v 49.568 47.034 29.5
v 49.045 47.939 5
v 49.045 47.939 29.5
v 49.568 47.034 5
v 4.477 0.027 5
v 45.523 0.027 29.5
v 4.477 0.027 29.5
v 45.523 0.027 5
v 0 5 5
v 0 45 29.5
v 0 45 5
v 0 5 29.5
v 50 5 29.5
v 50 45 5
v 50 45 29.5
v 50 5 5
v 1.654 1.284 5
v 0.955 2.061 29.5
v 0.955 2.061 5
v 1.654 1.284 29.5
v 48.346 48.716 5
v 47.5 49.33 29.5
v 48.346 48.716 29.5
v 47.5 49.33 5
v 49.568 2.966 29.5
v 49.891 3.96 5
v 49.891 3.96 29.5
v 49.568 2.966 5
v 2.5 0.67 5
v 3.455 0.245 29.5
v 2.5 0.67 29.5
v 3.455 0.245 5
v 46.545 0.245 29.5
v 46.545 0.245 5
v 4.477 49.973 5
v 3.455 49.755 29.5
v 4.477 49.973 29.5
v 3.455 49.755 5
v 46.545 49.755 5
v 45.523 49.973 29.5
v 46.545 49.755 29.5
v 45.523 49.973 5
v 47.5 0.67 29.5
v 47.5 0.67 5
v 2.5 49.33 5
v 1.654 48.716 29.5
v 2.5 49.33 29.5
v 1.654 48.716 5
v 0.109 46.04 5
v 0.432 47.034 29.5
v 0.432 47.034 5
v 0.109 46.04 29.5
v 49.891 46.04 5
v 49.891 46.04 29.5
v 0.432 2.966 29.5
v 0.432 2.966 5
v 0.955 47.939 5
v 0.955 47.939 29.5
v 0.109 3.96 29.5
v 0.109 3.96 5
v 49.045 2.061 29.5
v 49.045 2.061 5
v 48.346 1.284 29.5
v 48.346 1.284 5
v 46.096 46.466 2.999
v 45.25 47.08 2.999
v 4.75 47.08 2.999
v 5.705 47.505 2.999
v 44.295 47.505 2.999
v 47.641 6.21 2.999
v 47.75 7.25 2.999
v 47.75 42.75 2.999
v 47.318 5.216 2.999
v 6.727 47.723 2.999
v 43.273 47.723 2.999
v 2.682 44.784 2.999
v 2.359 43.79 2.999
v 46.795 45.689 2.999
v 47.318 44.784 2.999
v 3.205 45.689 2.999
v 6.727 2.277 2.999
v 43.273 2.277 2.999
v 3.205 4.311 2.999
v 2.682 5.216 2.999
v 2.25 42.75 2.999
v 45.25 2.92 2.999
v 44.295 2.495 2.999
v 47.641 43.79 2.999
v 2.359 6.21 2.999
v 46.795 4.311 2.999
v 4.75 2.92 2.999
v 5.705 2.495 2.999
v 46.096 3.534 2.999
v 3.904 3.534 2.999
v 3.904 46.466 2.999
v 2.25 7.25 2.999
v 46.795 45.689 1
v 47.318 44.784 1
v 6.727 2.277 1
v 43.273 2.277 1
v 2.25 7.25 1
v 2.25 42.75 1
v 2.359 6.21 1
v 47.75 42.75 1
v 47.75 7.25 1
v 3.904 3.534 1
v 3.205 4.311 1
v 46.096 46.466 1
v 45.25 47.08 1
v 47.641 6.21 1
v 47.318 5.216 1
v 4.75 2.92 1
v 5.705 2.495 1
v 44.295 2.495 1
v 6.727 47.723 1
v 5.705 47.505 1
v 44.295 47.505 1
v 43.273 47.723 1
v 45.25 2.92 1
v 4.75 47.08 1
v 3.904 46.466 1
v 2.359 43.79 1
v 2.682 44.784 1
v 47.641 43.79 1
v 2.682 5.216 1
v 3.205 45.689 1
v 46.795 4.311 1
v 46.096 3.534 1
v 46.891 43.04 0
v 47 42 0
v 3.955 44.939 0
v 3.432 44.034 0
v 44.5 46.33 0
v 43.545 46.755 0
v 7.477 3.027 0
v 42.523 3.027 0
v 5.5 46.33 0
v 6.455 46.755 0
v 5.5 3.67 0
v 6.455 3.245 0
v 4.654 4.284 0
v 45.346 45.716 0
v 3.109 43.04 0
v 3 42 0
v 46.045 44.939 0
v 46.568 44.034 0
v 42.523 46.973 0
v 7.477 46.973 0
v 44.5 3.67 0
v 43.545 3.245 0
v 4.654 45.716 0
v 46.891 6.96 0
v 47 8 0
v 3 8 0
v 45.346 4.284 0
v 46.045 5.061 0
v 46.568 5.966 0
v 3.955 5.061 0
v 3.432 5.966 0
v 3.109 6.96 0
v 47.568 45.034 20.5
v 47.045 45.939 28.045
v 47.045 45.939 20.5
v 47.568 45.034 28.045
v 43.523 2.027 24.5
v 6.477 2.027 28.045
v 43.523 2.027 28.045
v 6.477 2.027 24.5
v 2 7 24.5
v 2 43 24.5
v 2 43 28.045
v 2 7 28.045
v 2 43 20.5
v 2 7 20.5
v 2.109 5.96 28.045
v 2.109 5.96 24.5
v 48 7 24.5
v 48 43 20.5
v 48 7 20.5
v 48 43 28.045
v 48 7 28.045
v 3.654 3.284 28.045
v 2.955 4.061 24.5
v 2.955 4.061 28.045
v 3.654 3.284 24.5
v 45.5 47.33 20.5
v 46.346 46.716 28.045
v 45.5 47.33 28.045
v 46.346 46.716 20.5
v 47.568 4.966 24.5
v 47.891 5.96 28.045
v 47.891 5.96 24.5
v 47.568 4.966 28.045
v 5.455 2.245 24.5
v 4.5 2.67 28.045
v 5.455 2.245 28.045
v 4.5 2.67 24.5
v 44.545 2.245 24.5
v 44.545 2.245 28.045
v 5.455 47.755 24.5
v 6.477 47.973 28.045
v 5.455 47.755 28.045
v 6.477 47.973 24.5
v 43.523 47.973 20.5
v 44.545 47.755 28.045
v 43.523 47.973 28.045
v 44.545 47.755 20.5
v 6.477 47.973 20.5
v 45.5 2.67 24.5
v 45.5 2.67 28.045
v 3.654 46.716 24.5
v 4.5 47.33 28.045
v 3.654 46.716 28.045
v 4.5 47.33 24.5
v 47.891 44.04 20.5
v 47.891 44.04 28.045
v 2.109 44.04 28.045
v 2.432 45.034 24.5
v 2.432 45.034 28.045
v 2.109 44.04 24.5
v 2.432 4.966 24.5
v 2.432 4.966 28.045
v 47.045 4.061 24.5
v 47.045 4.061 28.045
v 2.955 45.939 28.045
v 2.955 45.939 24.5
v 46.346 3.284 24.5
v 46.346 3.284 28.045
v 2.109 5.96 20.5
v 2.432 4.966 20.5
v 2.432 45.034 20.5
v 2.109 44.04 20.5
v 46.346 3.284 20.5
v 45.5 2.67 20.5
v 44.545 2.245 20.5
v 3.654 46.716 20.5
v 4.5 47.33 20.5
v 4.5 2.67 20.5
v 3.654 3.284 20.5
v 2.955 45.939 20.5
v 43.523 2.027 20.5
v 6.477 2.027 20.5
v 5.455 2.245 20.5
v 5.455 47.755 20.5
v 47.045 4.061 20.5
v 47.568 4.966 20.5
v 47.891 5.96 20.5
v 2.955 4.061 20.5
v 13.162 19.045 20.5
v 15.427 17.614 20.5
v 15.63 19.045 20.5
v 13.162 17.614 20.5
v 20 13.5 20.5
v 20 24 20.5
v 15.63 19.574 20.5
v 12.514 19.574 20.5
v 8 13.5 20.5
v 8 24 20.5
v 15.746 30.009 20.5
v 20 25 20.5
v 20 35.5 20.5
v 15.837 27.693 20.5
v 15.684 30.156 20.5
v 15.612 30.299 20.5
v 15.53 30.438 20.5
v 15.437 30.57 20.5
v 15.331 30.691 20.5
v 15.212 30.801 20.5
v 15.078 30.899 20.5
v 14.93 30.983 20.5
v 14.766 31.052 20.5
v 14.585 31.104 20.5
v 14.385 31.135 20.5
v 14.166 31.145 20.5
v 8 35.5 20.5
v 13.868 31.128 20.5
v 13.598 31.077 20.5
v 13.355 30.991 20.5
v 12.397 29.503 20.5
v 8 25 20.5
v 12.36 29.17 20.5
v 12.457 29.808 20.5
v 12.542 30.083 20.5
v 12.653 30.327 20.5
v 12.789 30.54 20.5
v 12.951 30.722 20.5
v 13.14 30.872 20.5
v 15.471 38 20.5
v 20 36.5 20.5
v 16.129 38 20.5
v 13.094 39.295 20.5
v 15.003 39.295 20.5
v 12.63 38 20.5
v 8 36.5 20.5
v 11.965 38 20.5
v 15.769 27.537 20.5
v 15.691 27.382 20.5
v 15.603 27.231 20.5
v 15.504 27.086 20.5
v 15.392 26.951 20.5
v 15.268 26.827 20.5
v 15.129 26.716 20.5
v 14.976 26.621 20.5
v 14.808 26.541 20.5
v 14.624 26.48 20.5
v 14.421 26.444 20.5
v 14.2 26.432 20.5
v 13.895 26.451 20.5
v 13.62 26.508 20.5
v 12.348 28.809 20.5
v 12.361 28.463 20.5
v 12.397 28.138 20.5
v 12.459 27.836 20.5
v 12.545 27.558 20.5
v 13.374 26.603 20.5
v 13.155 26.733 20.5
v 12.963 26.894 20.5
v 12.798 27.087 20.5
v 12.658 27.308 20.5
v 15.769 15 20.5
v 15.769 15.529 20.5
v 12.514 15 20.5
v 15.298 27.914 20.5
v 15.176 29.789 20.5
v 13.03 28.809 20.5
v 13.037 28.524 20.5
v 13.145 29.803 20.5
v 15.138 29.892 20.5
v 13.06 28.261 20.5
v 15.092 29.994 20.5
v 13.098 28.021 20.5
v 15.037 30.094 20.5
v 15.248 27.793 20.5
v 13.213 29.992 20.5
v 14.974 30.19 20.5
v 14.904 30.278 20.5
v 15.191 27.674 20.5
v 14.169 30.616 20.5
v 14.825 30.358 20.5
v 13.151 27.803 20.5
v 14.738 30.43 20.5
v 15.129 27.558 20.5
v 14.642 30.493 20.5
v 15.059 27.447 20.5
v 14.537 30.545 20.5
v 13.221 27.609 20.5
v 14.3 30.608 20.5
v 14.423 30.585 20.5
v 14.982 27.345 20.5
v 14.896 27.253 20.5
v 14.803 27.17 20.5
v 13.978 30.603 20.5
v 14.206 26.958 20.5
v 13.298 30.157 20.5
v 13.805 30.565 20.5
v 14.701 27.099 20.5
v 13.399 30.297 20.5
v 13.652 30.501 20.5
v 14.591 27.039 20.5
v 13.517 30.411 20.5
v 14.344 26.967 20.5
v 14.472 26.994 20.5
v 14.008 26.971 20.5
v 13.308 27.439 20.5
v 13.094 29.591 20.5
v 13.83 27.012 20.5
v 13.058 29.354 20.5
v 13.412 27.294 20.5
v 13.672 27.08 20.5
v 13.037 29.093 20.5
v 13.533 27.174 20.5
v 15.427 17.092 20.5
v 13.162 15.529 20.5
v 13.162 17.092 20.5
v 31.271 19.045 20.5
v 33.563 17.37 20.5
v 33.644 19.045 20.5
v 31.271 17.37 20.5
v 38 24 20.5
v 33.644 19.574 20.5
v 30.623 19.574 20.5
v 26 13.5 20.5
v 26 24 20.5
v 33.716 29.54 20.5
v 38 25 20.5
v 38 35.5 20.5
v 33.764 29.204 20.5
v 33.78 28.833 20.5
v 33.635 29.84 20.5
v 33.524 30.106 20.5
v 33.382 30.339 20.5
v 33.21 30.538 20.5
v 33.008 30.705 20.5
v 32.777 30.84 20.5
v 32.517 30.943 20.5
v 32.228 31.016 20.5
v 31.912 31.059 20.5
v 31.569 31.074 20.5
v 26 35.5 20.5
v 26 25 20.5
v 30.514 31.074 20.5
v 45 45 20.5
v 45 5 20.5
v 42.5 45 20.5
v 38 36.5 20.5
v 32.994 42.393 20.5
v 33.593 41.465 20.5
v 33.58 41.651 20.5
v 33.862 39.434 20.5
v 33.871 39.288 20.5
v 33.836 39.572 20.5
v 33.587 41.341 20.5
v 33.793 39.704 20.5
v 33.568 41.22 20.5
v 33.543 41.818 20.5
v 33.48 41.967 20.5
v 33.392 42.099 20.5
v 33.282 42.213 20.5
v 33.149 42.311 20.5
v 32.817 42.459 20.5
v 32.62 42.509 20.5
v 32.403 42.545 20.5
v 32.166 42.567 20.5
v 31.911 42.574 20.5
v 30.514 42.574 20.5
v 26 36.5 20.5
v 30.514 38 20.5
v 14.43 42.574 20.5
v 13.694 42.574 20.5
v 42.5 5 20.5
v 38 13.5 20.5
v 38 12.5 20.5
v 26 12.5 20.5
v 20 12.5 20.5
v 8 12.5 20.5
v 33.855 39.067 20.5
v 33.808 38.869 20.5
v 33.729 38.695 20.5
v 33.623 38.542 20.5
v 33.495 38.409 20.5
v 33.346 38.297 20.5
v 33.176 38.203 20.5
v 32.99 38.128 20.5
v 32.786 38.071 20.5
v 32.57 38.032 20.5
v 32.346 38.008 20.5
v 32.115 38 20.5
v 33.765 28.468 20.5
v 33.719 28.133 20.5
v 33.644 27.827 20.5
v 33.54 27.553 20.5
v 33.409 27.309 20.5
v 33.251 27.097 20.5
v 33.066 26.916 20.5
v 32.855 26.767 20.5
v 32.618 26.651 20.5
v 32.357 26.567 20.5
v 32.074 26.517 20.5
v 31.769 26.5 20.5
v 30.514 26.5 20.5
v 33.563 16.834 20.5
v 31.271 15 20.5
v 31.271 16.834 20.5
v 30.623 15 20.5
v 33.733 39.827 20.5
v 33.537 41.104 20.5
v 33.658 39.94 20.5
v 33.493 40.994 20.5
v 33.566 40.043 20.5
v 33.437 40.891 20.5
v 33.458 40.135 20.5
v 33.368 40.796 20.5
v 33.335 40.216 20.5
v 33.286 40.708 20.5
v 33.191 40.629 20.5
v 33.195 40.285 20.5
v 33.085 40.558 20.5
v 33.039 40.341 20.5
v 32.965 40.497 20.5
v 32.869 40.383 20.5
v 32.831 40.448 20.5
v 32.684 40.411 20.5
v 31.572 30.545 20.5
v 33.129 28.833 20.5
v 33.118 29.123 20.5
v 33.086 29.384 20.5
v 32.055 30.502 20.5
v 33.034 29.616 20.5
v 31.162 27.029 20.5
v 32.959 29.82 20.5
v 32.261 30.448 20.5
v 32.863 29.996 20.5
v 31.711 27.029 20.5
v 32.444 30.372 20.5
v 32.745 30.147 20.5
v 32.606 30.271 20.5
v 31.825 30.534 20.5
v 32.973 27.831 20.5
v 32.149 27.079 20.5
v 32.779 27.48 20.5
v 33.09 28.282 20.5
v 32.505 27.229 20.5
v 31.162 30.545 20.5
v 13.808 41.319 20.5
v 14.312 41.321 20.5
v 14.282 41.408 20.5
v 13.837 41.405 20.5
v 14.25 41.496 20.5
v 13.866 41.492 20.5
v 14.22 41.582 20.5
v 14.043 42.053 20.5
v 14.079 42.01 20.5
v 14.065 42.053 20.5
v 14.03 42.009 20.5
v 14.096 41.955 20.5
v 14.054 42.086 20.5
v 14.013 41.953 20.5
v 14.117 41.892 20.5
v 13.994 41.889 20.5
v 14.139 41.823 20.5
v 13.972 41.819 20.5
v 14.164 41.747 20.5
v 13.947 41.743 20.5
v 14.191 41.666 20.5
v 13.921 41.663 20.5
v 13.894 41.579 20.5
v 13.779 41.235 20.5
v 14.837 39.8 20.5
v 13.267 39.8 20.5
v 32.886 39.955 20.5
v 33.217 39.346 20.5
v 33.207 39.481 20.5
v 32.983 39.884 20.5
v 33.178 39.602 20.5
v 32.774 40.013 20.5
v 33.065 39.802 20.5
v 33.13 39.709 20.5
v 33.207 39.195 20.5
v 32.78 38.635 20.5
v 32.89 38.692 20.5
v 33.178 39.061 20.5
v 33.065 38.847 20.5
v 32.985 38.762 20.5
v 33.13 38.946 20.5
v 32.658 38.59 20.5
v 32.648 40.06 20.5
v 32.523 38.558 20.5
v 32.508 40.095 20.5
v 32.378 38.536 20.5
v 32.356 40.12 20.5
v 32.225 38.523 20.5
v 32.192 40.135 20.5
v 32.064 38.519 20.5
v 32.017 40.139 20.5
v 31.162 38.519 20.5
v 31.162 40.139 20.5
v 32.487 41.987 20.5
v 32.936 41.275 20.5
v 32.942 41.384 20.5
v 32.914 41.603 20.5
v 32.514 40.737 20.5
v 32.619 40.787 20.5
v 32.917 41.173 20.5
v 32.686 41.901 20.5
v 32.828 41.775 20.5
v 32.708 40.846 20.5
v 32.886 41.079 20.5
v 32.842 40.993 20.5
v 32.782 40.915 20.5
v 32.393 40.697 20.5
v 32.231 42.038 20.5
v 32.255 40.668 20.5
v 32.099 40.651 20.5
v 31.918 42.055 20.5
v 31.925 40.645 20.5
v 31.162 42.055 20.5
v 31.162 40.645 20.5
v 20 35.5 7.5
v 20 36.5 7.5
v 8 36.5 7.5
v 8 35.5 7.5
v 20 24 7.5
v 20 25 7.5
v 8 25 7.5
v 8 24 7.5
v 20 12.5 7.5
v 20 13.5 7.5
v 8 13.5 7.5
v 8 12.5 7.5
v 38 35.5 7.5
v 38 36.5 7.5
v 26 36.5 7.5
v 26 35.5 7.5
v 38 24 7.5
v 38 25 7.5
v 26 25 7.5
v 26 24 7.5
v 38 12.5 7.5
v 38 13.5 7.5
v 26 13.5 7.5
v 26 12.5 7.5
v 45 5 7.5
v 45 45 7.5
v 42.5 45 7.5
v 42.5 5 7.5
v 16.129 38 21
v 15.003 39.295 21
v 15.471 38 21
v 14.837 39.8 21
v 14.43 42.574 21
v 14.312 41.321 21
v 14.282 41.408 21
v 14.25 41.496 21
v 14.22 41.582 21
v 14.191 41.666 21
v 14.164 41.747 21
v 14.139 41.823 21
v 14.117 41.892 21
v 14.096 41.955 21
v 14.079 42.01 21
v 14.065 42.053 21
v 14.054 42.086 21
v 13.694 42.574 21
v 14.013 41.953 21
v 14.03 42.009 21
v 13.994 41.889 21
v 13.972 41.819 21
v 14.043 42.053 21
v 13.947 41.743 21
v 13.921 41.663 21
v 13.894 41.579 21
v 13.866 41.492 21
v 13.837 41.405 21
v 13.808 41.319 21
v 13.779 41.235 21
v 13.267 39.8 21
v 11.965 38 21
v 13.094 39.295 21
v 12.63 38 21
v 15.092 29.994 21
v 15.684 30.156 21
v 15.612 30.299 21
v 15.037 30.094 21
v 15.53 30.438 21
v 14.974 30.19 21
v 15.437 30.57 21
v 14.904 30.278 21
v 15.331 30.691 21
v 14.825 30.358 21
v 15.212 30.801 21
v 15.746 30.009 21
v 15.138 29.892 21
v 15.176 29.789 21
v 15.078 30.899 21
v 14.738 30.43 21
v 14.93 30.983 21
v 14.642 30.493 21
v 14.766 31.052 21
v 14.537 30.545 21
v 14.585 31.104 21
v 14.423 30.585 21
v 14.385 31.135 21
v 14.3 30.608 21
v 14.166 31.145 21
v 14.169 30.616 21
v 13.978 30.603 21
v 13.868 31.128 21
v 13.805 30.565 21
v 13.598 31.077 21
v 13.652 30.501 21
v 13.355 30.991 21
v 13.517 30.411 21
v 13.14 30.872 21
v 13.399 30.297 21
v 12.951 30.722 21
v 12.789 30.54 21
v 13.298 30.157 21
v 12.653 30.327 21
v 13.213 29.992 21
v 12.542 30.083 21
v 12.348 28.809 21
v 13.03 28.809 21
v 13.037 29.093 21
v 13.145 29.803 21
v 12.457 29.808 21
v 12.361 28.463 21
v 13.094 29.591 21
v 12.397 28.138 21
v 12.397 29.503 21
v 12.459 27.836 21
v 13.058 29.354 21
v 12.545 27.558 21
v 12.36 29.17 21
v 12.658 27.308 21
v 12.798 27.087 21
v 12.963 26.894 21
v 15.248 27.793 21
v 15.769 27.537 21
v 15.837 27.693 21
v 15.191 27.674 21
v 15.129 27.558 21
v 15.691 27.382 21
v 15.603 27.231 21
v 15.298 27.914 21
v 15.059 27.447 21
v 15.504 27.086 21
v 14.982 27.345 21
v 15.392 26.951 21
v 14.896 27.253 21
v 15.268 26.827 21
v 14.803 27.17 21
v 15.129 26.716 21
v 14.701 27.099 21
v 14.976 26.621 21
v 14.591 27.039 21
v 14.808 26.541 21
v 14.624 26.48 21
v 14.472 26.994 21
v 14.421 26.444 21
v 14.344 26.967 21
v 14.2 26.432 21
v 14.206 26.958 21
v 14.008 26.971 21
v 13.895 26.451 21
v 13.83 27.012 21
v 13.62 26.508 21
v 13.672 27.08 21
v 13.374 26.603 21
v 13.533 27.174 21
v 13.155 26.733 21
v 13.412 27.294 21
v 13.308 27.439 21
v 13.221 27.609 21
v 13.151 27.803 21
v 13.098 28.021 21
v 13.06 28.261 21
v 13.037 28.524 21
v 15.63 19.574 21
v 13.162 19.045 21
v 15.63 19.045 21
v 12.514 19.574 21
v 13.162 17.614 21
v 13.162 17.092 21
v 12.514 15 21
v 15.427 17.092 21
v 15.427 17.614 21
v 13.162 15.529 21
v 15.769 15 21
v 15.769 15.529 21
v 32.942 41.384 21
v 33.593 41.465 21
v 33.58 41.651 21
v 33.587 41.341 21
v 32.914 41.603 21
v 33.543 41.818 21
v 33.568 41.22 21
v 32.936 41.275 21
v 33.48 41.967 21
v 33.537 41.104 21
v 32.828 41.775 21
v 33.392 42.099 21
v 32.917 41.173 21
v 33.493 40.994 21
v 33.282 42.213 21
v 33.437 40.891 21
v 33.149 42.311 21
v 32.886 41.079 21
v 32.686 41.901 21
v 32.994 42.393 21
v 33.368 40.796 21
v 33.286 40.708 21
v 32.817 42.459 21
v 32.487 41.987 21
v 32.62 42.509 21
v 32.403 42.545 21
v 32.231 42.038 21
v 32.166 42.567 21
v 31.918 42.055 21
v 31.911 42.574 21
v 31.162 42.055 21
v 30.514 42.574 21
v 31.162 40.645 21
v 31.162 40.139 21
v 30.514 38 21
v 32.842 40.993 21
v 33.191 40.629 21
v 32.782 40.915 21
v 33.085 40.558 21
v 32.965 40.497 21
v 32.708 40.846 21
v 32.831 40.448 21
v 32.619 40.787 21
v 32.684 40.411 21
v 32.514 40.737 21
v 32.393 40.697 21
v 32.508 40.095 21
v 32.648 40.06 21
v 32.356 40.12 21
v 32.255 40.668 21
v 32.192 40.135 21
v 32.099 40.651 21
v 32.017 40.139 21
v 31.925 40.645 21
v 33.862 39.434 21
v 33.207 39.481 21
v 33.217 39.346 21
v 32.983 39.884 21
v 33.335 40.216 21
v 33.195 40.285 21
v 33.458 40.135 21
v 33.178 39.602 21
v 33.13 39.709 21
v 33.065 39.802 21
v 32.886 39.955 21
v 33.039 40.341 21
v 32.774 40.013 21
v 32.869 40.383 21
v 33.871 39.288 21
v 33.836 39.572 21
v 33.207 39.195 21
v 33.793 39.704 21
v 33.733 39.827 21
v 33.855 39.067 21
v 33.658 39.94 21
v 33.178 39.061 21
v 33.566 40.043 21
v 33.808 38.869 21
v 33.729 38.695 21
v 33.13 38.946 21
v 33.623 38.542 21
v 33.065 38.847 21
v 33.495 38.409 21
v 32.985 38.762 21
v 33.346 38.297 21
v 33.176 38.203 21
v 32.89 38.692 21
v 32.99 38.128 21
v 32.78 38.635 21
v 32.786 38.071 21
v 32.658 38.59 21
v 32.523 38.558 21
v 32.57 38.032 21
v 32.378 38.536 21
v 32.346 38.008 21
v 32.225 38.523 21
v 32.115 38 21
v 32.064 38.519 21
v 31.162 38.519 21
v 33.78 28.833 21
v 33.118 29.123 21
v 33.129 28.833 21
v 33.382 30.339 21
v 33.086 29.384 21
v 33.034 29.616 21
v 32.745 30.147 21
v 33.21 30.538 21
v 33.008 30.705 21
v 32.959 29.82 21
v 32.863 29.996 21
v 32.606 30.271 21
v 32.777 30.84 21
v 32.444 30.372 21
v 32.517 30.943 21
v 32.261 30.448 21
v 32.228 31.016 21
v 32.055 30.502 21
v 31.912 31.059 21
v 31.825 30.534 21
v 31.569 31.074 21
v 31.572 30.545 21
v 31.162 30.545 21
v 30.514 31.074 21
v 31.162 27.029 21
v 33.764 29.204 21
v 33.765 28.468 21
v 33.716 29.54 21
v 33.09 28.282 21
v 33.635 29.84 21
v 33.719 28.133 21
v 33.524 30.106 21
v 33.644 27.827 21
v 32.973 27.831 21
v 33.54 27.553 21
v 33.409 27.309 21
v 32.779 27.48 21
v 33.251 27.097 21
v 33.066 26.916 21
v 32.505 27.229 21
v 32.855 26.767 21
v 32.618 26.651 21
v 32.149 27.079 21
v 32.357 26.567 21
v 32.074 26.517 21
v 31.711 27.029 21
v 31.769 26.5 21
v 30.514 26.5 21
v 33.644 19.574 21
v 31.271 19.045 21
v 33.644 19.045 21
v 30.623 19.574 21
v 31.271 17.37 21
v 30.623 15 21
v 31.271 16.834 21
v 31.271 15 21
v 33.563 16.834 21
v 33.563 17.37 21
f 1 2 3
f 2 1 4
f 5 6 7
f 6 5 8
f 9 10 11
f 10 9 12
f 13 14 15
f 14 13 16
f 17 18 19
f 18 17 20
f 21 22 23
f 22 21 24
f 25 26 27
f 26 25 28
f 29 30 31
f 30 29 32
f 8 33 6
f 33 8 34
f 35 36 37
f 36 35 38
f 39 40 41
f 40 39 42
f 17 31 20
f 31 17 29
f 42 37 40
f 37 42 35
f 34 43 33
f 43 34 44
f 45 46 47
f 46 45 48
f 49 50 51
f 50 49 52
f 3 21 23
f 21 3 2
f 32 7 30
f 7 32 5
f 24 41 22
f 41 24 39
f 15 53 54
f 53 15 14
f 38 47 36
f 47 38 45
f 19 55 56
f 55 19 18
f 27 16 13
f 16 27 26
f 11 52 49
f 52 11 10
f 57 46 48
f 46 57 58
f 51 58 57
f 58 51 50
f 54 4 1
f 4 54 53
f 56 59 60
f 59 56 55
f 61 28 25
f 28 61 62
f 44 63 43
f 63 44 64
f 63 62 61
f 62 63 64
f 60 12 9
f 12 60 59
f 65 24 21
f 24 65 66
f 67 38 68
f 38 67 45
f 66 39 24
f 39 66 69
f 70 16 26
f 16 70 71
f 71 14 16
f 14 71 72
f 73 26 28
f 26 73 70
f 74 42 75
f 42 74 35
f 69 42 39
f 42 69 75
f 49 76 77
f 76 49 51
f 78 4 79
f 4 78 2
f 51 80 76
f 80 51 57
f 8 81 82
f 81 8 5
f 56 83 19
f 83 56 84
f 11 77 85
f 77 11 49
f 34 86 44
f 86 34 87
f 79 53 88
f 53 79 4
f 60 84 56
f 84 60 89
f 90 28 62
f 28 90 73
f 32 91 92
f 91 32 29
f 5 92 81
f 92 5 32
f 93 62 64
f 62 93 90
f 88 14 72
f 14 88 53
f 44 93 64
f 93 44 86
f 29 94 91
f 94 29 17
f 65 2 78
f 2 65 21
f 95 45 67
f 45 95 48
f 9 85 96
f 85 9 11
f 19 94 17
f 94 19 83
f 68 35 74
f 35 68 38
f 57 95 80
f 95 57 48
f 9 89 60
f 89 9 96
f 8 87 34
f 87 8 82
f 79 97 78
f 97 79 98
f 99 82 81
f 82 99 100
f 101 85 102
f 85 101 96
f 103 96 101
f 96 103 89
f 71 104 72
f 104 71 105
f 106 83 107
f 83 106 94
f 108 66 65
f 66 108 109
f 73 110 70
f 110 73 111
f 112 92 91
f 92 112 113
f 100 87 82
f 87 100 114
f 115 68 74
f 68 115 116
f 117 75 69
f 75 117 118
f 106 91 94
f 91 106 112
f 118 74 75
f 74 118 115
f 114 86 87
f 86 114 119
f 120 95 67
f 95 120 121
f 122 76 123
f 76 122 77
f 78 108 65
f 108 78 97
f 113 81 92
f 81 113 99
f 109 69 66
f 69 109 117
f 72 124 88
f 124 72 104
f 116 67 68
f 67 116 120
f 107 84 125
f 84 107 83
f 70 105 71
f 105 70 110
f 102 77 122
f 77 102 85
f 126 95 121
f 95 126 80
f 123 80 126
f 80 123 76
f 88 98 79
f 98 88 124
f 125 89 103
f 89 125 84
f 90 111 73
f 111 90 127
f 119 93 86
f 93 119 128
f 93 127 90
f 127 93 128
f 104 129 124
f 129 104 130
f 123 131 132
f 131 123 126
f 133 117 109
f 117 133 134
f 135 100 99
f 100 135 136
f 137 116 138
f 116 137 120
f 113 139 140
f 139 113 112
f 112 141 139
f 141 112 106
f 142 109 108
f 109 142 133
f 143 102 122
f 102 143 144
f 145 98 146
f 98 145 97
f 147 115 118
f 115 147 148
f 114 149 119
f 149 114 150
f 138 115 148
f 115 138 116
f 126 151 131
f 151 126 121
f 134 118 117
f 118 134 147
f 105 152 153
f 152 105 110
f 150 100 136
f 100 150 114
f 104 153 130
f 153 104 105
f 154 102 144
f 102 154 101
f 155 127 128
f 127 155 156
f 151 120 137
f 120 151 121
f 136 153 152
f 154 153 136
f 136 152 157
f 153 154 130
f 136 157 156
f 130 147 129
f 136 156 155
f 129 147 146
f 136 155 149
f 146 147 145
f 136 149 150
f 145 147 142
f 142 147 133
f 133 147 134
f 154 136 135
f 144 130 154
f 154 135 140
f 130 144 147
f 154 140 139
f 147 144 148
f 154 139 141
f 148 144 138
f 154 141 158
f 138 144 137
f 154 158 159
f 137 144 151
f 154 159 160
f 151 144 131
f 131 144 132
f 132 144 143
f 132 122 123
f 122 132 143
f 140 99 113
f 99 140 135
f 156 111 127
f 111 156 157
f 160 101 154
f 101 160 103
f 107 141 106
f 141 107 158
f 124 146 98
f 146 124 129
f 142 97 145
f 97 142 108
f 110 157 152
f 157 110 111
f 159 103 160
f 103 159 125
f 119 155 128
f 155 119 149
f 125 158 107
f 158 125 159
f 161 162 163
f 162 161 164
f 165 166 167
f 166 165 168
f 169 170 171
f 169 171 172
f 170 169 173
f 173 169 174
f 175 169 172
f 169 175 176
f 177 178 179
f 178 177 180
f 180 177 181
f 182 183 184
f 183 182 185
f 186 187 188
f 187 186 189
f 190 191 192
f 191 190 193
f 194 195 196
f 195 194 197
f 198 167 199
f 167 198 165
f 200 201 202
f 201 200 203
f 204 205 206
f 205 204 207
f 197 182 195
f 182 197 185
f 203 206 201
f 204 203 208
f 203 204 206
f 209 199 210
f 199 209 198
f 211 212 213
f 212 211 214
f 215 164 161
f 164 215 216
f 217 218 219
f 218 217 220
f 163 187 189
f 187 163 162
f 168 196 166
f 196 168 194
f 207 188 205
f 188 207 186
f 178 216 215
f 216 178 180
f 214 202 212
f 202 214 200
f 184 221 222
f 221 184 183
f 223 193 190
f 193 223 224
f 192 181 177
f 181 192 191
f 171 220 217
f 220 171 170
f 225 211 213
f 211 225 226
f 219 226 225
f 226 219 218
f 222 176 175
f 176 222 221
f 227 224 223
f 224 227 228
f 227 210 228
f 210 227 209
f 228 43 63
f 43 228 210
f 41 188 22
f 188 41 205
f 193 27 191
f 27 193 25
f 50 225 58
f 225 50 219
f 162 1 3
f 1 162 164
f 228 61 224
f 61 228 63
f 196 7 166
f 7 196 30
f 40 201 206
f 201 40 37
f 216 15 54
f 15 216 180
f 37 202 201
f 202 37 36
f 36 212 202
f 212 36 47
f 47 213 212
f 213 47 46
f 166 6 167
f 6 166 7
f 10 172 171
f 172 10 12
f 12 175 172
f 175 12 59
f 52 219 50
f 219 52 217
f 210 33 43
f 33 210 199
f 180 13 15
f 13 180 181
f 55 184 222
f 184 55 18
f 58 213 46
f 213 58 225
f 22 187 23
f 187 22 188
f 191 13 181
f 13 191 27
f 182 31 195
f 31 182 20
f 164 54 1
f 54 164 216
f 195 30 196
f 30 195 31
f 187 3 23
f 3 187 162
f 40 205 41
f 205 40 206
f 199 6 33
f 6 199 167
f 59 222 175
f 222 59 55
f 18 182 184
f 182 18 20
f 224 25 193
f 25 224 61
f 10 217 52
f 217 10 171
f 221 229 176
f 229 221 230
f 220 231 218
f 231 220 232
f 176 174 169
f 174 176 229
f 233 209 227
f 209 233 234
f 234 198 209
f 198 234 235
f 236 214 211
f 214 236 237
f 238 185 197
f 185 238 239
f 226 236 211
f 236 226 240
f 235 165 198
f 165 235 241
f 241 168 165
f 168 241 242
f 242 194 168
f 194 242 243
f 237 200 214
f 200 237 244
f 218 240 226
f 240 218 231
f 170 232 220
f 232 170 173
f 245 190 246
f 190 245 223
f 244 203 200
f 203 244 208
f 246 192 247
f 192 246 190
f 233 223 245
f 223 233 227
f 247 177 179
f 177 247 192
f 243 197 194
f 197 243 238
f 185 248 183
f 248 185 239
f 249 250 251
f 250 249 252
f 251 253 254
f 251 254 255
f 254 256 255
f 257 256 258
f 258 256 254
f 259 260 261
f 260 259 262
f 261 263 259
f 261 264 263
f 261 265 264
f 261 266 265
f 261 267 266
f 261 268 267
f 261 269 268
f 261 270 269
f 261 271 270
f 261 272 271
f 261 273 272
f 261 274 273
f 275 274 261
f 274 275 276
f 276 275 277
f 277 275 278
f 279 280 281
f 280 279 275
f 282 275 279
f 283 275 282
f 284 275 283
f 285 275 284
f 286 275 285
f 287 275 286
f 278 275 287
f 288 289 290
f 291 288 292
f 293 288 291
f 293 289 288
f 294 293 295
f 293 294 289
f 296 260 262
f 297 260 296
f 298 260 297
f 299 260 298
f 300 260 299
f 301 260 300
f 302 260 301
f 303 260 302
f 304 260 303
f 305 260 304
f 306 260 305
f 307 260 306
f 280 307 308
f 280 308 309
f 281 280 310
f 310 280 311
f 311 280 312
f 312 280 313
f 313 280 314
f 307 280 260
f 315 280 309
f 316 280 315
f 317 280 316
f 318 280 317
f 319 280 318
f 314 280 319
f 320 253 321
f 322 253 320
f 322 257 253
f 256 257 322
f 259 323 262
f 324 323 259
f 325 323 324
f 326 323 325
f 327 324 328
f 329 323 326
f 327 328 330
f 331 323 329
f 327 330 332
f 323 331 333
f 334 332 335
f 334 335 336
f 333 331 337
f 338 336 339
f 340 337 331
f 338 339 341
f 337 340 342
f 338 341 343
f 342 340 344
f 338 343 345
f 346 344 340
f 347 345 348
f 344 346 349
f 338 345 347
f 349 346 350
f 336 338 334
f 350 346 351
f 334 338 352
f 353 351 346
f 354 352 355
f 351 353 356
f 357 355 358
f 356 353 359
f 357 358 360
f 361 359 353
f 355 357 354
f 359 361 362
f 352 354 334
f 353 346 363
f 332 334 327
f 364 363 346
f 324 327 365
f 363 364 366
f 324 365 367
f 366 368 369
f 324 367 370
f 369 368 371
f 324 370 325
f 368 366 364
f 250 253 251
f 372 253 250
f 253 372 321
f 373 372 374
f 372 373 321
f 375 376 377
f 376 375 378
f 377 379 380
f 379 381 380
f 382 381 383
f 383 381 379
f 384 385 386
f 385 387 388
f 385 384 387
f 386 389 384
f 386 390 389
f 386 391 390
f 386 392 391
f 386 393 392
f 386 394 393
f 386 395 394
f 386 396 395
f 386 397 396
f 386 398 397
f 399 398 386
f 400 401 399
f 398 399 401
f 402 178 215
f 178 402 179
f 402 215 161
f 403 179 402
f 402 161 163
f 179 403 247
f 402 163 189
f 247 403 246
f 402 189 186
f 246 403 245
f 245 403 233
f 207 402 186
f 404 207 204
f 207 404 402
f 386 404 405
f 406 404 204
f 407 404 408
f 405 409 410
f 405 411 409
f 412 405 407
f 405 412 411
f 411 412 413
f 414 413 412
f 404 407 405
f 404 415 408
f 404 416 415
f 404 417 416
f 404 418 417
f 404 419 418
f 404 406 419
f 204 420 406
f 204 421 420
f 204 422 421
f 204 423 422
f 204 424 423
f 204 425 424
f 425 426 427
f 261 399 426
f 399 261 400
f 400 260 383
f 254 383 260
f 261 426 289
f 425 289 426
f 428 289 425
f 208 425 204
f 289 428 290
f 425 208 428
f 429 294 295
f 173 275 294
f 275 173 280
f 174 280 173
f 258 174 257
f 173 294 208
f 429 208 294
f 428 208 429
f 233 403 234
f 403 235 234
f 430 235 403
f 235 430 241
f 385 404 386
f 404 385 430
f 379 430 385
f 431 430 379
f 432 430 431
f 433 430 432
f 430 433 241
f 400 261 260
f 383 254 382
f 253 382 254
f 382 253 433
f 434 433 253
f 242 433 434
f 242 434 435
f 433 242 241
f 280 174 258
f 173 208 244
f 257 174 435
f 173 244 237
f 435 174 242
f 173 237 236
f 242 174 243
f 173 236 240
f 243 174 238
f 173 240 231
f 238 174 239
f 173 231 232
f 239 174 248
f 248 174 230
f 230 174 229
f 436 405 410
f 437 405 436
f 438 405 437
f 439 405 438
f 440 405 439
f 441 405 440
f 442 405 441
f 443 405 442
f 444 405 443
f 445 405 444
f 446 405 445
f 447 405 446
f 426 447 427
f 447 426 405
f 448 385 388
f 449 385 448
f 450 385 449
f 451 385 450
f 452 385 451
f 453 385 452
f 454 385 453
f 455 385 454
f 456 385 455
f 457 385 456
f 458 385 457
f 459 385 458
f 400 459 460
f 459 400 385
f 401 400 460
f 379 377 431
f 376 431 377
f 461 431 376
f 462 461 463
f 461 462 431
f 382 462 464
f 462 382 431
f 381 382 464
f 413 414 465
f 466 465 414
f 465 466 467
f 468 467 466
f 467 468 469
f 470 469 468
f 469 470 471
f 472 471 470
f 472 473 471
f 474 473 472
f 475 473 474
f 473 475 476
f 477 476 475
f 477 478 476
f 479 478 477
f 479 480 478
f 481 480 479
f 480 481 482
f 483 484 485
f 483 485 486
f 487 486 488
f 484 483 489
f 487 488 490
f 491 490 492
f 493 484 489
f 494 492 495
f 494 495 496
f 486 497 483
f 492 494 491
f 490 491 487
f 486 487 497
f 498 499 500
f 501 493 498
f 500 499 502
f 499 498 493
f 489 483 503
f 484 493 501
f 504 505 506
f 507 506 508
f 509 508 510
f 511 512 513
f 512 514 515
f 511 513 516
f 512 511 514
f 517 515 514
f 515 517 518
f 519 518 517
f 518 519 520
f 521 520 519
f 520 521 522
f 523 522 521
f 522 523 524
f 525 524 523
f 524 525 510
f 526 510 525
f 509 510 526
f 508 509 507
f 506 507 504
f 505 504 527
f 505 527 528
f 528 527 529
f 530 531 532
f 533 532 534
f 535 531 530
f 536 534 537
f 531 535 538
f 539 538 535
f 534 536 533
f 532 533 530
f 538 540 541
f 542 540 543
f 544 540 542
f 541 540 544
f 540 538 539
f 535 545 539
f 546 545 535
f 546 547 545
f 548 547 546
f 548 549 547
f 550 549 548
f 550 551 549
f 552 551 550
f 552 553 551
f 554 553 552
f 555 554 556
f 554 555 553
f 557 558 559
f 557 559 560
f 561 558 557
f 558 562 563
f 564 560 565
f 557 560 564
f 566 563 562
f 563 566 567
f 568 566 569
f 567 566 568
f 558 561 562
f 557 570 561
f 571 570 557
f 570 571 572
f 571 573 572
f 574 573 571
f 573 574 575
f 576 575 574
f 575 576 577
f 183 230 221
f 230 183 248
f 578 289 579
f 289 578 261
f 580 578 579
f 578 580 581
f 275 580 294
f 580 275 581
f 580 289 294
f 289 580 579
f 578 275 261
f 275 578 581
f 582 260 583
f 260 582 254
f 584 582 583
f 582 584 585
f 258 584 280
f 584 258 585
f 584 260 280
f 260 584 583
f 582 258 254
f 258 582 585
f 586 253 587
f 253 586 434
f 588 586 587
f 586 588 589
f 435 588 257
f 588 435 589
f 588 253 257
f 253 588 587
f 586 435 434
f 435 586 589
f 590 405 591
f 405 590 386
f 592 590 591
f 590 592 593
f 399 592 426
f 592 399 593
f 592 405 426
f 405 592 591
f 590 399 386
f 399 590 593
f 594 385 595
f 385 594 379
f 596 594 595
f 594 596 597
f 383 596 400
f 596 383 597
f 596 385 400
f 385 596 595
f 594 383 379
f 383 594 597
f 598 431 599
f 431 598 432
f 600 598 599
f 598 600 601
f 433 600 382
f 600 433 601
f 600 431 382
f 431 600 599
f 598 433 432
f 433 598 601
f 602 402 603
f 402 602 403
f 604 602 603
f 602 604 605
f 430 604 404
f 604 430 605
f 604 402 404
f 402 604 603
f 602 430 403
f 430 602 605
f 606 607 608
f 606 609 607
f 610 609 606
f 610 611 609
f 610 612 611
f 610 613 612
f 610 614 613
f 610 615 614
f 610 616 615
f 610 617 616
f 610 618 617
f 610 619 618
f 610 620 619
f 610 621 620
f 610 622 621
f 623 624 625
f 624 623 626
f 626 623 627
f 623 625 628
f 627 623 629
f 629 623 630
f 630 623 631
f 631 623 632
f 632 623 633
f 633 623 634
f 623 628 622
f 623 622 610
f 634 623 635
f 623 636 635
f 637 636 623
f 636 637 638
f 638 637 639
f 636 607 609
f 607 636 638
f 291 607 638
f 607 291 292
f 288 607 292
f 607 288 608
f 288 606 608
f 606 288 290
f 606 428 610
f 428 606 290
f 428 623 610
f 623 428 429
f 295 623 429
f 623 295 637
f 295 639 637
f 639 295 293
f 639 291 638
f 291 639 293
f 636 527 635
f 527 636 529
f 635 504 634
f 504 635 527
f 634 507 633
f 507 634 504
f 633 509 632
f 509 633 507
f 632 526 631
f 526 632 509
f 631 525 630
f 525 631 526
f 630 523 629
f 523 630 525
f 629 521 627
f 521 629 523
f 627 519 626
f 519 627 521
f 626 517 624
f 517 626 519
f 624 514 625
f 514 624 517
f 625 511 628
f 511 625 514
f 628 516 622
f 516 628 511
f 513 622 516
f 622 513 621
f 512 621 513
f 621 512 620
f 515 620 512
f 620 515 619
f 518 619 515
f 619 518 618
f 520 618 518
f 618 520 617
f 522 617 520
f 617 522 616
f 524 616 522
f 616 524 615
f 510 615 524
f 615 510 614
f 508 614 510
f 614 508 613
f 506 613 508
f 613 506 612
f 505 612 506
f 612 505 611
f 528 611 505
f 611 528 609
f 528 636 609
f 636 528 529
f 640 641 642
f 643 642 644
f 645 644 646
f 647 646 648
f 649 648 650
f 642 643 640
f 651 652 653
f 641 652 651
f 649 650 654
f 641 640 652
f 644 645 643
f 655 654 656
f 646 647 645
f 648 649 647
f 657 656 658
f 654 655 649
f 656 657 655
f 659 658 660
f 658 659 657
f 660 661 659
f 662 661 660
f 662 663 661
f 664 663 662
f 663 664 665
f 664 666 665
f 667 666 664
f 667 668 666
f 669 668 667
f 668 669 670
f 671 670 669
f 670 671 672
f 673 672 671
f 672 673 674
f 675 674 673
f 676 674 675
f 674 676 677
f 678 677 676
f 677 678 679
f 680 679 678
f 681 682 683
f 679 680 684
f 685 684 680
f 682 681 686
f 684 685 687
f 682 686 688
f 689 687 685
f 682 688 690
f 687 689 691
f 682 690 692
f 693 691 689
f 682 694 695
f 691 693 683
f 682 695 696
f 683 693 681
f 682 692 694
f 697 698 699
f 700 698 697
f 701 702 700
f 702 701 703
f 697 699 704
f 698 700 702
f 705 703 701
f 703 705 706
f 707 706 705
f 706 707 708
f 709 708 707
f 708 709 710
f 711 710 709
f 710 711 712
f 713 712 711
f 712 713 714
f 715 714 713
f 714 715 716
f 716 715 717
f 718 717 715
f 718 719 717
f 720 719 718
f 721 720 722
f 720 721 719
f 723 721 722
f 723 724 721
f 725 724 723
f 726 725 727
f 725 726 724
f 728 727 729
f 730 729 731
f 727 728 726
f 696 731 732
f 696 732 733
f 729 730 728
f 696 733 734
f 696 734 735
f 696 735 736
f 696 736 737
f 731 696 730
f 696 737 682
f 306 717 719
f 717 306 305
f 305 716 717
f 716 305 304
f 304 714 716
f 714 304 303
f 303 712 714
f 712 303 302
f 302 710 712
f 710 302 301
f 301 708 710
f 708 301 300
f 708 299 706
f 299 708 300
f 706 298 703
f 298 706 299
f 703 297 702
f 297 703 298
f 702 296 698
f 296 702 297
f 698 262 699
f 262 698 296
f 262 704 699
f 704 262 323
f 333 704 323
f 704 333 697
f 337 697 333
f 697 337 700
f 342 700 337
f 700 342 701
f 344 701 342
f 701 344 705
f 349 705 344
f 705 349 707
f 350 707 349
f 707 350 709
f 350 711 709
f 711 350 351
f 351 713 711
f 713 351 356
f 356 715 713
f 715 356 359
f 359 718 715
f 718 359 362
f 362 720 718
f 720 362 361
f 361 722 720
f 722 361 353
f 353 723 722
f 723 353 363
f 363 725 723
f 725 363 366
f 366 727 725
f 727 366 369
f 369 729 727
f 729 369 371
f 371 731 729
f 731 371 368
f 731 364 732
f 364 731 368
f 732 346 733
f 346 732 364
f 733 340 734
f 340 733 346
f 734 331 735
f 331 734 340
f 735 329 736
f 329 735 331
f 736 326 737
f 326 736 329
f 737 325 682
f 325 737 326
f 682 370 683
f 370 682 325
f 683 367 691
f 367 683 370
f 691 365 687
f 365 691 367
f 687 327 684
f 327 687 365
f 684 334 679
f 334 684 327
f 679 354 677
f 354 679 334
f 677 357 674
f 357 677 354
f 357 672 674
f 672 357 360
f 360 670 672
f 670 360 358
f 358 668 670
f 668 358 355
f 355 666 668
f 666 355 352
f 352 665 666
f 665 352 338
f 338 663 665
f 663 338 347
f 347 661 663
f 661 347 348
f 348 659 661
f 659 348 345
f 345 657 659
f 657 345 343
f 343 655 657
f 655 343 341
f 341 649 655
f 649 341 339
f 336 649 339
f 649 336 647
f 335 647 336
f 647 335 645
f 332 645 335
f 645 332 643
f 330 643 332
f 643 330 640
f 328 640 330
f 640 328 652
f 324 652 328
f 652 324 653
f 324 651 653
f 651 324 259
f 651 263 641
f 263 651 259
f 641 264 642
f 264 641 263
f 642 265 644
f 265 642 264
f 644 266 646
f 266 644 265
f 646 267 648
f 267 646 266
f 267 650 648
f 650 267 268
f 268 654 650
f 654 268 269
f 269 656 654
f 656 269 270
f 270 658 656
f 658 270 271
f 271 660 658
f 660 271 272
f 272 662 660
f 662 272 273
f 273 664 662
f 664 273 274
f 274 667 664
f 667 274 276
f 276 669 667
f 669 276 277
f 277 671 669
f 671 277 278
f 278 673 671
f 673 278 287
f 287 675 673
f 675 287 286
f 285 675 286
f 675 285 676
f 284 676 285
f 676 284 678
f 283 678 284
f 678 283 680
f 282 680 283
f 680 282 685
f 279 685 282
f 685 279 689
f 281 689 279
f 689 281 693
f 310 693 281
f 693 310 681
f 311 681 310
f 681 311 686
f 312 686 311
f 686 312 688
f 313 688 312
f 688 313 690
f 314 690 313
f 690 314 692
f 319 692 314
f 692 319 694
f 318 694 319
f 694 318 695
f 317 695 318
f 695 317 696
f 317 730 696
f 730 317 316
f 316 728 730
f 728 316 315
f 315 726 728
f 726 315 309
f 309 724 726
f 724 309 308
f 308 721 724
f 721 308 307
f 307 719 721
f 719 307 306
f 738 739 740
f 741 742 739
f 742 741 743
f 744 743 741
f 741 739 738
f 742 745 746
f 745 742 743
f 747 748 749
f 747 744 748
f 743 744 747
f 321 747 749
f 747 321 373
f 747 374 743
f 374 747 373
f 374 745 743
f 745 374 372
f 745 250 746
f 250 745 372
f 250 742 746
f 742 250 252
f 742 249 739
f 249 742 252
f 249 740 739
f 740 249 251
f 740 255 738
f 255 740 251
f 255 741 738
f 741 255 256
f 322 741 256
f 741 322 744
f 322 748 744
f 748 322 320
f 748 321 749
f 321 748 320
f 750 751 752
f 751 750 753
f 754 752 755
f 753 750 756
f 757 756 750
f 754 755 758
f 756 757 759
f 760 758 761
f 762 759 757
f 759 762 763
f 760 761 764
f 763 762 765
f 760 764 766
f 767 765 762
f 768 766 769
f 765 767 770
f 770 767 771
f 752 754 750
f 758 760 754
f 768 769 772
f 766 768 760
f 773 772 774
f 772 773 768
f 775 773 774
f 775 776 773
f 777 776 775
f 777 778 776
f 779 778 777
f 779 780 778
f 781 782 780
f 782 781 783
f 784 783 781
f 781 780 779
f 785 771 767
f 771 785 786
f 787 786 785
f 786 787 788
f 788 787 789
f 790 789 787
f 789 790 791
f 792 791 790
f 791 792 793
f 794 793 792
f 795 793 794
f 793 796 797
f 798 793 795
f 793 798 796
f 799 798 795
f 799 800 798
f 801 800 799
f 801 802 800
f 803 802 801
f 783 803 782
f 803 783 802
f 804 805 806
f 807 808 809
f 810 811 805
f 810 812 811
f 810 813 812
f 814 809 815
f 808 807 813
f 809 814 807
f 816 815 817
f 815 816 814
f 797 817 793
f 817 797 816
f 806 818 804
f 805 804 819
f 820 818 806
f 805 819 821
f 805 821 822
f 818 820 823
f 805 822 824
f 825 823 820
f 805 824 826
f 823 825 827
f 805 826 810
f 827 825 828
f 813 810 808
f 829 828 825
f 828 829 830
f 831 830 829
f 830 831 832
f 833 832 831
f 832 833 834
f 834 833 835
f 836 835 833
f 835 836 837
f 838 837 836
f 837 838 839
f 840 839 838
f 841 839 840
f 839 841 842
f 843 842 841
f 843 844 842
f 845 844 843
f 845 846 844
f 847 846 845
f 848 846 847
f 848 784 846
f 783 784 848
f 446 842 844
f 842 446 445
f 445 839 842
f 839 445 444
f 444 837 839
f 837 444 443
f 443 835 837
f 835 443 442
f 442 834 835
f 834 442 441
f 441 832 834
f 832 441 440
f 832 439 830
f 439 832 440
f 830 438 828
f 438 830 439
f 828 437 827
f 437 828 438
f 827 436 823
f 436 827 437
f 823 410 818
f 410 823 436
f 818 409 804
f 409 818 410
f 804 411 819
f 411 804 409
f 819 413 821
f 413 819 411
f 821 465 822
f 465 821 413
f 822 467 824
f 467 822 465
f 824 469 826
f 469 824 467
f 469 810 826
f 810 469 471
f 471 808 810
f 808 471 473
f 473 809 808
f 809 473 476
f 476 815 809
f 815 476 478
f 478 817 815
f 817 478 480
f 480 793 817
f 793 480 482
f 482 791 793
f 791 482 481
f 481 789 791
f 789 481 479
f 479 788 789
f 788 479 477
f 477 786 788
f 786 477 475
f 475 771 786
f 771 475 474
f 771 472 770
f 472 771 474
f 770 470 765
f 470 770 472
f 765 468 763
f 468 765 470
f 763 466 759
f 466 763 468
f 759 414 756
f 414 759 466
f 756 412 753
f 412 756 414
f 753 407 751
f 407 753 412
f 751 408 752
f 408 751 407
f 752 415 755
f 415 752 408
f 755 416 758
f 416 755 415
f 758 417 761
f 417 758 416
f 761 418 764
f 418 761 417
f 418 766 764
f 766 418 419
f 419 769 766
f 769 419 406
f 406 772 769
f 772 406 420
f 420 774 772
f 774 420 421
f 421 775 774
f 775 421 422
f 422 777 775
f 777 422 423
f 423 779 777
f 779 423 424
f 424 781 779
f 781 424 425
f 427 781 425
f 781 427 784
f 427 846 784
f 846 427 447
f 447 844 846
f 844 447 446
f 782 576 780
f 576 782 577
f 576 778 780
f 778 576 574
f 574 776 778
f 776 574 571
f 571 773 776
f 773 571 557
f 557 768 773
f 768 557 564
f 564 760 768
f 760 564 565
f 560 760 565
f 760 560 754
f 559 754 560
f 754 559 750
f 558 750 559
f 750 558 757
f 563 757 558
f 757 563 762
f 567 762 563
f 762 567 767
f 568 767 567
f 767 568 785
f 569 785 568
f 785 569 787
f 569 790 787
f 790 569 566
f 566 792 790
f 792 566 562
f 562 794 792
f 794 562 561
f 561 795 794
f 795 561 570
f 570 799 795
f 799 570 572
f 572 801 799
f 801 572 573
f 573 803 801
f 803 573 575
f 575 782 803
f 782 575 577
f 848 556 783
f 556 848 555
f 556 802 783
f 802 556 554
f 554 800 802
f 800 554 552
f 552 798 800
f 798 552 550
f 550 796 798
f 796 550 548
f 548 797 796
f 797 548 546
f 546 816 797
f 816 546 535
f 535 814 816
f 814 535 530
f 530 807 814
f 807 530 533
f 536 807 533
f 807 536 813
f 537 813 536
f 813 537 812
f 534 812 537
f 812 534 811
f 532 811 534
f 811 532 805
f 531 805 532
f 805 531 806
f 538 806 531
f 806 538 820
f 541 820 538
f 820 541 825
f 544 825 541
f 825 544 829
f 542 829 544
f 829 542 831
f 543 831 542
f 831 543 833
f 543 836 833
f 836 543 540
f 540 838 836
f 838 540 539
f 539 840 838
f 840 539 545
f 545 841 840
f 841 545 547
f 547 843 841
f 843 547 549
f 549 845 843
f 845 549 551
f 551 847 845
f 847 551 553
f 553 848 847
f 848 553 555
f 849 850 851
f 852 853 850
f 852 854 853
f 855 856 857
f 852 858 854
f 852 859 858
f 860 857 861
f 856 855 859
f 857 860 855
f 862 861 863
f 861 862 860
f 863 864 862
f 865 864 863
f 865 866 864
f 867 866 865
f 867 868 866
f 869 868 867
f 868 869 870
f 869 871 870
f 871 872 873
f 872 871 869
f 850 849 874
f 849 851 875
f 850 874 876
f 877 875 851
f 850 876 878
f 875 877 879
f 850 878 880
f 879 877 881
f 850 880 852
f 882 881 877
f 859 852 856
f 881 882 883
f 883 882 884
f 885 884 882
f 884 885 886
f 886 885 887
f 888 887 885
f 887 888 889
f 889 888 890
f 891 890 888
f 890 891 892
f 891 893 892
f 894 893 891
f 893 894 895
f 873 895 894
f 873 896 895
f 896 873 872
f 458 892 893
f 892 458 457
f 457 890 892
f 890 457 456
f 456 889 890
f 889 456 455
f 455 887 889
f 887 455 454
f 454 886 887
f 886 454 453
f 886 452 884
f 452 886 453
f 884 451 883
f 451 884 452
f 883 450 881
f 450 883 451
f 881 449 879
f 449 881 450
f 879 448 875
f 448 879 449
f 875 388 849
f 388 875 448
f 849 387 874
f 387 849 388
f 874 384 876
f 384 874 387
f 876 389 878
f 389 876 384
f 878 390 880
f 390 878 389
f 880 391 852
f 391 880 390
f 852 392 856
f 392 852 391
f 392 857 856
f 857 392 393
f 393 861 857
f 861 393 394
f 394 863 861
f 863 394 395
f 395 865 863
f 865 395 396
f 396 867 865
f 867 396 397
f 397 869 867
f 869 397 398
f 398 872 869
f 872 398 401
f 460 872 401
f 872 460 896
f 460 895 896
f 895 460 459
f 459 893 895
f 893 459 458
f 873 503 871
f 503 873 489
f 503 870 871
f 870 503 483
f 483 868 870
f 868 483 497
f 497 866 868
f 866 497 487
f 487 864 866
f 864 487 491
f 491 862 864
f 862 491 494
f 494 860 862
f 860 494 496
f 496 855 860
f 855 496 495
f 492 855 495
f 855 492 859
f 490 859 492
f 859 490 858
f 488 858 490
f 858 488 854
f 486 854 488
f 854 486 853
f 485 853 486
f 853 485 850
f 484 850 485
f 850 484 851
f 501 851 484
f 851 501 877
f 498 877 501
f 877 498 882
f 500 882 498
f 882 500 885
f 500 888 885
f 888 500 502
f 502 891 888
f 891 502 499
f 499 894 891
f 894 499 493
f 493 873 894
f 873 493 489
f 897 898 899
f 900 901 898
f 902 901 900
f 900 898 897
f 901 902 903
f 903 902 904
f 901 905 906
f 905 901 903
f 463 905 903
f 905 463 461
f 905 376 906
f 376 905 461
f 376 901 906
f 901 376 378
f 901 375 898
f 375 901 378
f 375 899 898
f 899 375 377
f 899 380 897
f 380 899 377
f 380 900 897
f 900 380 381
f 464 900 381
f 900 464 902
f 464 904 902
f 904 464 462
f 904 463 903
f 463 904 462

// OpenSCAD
// file: modules.scad
// Demos
frame(50, 1*25);
translate([55, 0, 0]) frame(50, 2*25);
translate([25, 55, 0]) frame(
        head_size=[100, 50], head_height=1*25,
        body_size=[100-4.5, 50-4.5], foot_size=[100-6, 50-6]);
translate([-55, 25, 0]) frame(
        head_size=[50, 100], head_height=1*25,
        body_size=[50-4.5, 100-4.5], foot_size=[50-6, 100-6]);

module frameallowed(
        head_size=50, head_height=25, neck_height=2, body_size=45.5, body_height=2,
        leg_height=1, foot_size=44, r=5, fn=30, really_small_number=0.001,
        thickness=2, stacking_body_size_tolerance=0.5,
        stacking_height_sans_head_tolerance=0.5) {
    // Use this for an intersect, to trim protruding elements.

    head_size = head_size[0] == undef ? [head_size, head_size] : head_size;
    body_size = body_size[0] == undef ? [body_size, body_size] : body_size;
    foot_size = foot_size[0] == undef ? [foot_size, foot_size] : foot_size;

    union() {
        frame(
            head_size=head_size, head_height=head_height, neck_height=neck_height,
            body_size=body_size, body_height=body_height, leg_height=leg_height,
            foot_size=foot_size, r=r, fn=fn, 
            really_small_number=really_small_number,
            thickness=thickness, 
            stacking_body_size_tolerance=stacking_body_size_tolerance,
            stacking_height_sans_head_tolerance=stacking_height_sans_head_tolerance);
        framefilled(
            head_size=head_size,
            head_height=head_height-neck_height-body_height-leg_height-
                stacking_height_sans_head_tolerance,
            neck_height=neck_height, body_size=body_size,
            body_height=body_height, leg_height=leg_height,
            foot_size=foot_size, r=r, fn=fn, 
            really_small_number=really_small_number);
    }
}

module frame(
        head_size=50, head_height=25, neck_height=2, body_size=45.5, body_height=2,
        leg_height=1, foot_size=44, r=5, fn=30, really_small_number=0.001,
        thickness=2, stacking_body_size_tolerance=0.5,
        stacking_height_sans_head_tolerance=0.5) {

    head_size = head_size[0] == undef ? [head_size, head_size] : head_size;
    body_size = body_size[0] == undef ? [body_size, body_size] : body_size;
    foot_size = foot_size[0] == undef ? [foot_size, foot_size] : foot_size;

    difference() {
        framefilled(
            head_size=head_size, head_height=head_height, neck_height=neck_height,
            body_size=body_size, body_height=body_height, leg_height=leg_height,
            foot_size=foot_size, r=r, fn=fn, 
            really_small_number=really_small_number);
        translate([0, 0, thickness])
            framefilled(
                head_size=[head_size[0]-2*thickness, head_size[1]-2*thickness],
                head_height=head_height-thickness,
                neck_height=neck_height,
                body_size=[body_size[0]-2*thickness, body_size[1]-2*thickness],
                body_height=body_height, leg_height=leg_height,
                foot_size=[foot_size[0]-2*thickness, foot_size[1]-2*thickness],
                r=r, fn=fn, really_small_number=really_small_number);
        translate([0, 0, head_height-stacking_height_sans_head_tolerance])
            framefilled(
                head_size=head_size, head_height=head_height,
                neck_height=neck_height,
                body_size=[
                    body_size[0]-2*stacking_body_size_tolerance,
                    body_size[1]-2*stacking_body_size_tolerance],
                body_height=body_height, leg_height=leg_height,
                foot_size=[
                    foot_size[0]-2*stacking_body_size_tolerance,
                    foot_size[1]-2*stacking_body_size_tolerance],
                r=r, fn=fn, really_small_number=really_small_number);
    }
}

// NB the body size must be slightly smaller than head_size minus twice
// the thickness, so that the frames can stack.
module framefilled(
        head_size=50, head_height=25, neck_height=2, body_size=45.5, body_height=2,
        leg_height=1, foot_size=44, r=5, fn=30, really_small_number=0.001) {

    head_size = head_size[0] == undef ? [head_size, head_size] : head_size;
    body_size = body_size[0] == undef ? [body_size, body_size] : body_size;
    foot_size = foot_size[0] == undef ? [foot_size, foot_size] : foot_size;

    union() {
        hull() {head(); crown();}
        hull() {body(); head();}
        hull() {leg(); body();}
        hull() {foot(); leg();}
    }

    module crown() {
        translate(
            [0, 0, leg_height+body_height+neck_height+head_height-really_small_number])
        linear_extrude(height=really_small_number)
            roundedsquare(head_size, r=r, center=true, $fn=fn);
    }

    module head() {
        translate([0, 0, leg_height+body_height+neck_height])
        linear_extrude(height=really_small_number)
            roundedsquare(head_size, r=r, center=true, $fn=fn);
    }

    module body() {
        translate([0, 0, leg_height+body_height-really_small_number])
        linear_extrude(height=really_small_number)
            roundedsquare(body_size, r=r, center=true, $fn=fn);
    }

    module leg() {
        translate([0, 0, leg_height])
        linear_extrude(height=really_small_number)
            roundedsquare(body_size, r=r, center=true, $fn=fn);
    }

    module foot() {
        linear_extrude(height=really_small_number)
            roundedsquare(foot_size, r=r, center=true, $fn=fn);
    }
}

module roundedsquare(
        size=1, r=0.5, center=false, fn=30, really_small_number=0.001) {
    // Draw a square or rectangle with rounded corners.
    //
    // - size :: a number for length of the sides of a square, or a vector of
    //           two numbers for the width and height of a rectangle.
    // - r :: a number for radius of the rounded corners, or a vector of four
    //        numbers for the radii of of the top-right, top-left, bottom-left,
    //        and bottom-right rounded corners respectively (top and right are
    //        the positive y and x directions respectively); 0 indicates that
    //        a corner should not be rounded
    // - center :: boolean indicating if the shape should be centered
    // - fn :: the $fn parameter for circles, used for all rounded corners
    // - really_small_number :: a number which is effectively zero but not
    //                          actually zero; used internally to draw points

    size = size[0] == undef ? [size, size] : size;
    r = r[0] == undef ? [r, r, r, r] : r;

    translate(center ? [-size[0]/2, -size[1]/2] : [0, 0])
        hull() {
            // Top-right corner
            if (r[0] == 0) {
                translate(
                        [size[0]-really_small_number,
                         size[1]-really_small_number])
                    square(really_small_number);
            } else {
                translate([size[0]-r[0], size[1]-r[0]])
                    circle(r=r[0], $fn=fn);
             }
             // Top-left corner
            if (r[1] == 0) {
                translate([0, size[1]-really_small_number])
                    square(really_small_number);
            } else {
                translate([r[1], size[1]-r[1]])
                    circle(r=r[1], $fn=fn);
             }
             // Bottom-left corner
            if (r[2] == 0) {
                translate([0, 0])
                    square(really_small_number);
            } else {
                translate([r[2], r[2]])
                    circle(r=r[2], $fn=fn);
             }
             // Bottom-right corner
             if (r[3] == 0) {
                translate([size[0]-really_small_number, 0])
                    square(really_small_number);
            } else {
                translate([size[0]-r[3], r[3]])
                    circle(r=r[3], $fn=fn);
             }
         }
}
// main file
use <modules.scad>;

// The dimensions of a micro SD card
microsd_size = [11, 1, 15];
// The difference between dimensions of the slot and the aforementioned
microsd_tolerance = [1, 0, -2];
// Estimated space between top of a slotted SD card and frame stacked above
microsd_stack_gap = 2;
// Gap for a paper note
paper_size = [1.5, 40, 20];

thickness_wall = 2;
slot_left_margin = 6;
font_size = 5;
font_height = 0.5;

union() {
    difference() {
        // Easier to compute offsets if corner is at 0, 0
        translate([25, 25]) frameallowed();

        // Clearance between a frame stacked above, and the tip of a slotted SD
        // The z-translation is head height minus stacking_height_sans_head_tolerance,
        // minus height of the clearance.
        translate([25, 25, 25-0.5-(microsd_stack_gap-microsd_tolerance[2])])
        linear_extrude(height=microsd_stack_gap-microsd_tolerance[2])
            roundedsquare(size=[46, 46], r=5, center=true);

        // Slot A; the z-translation is the head height minus
        // stacking_height_sans_head_tolerance minus the clearance from the
        // previous statement minus the z-size of the slot.
        translate([
                thickness_wall + slot_left_margin, 
                thickness_wall + 3*46/4 - microsd_size[1],
                25 - 0.5 -
                    (microsd_stack_gap-microsd_tolerance[2]) -
                    (microsd_size + microsd_tolerance)[2]])
            cube(microsd_size+microsd_tolerance);

        // Slot C
        translate([
                thickness_wall + slot_left_margin, 
                thickness_wall + 2*46/4 -microsd_size[1],
                25 - 0.5 -
                    (microsd_stack_gap-microsd_tolerance[2]) -
                    (microsd_size + microsd_tolerance)[2]])
            cube(microsd_size+microsd_tolerance);

        // Slot E
        translate([
                thickness_wall + slot_left_margin, 
                thickness_wall + 46/4 - microsd_size[1],
                25 - 0.5 -
                    (microsd_stack_gap-microsd_tolerance[2]) -
                    (microsd_size + microsd_tolerance)[2]])
            cube(microsd_size+microsd_tolerance);

        // Slot B
        translate([
                thickness_wall + slot_left_margin + 
                    microsd_size[0]+microsd_tolerance[0] + slot_left_margin, 
                thickness_wall + 3*46/4 - microsd_size[1],
                25 - 0.5 -
                    (microsd_stack_gap-microsd_tolerance[2]) -
                    (microsd_size + microsd_tolerance)[2]])
            cube(microsd_size+microsd_tolerance);

        // Slot D
        translate([
                thickness_wall + slot_left_margin + 
                    microsd_size[0]+microsd_tolerance[0] + slot_left_margin,
                thickness_wall + 2*46/4 - microsd_size[1],
                25 - 0.5 -
                    (microsd_stack_gap-microsd_tolerance[2]) -
                    (microsd_size + microsd_tolerance)[2]])
            cube(microsd_size+microsd_tolerance);

        // Slot F
        translate([
                thickness_wall + slot_left_margin +
                    microsd_size[0]+microsd_tolerance[0] + slot_left_margin, 
                thickness_wall + 46/4 - microsd_size[1],
                25 - 0.5 -
                    (microsd_stack_gap-microsd_tolerance[2]) -
                    (microsd_size + microsd_tolerance)[2]])
            cube(microsd_size+microsd_tolerance);

        // Slot for paper
        translate([
                thickness_wall + slot_left_margin + 
                    microsd_size[0]+microsd_tolerance[0] + slot_left_margin +
                    microsd_size[0]+microsd_tolerance[0] + slot_left_margin -
                    paper_size[0],
                thickness_wall + 3,
                25 - 0.5 -
                    (microsd_stack_gap-microsd_tolerance[2]) -
                    (microsd_size + microsd_tolerance)[2]])
        cube(paper_size+microsd_tolerance);
    }

    // Slot A
    translate([
            thickness_wall + slot_left_margin + 
                (microsd_size+microsd_tolerance)[0]/2,
            thickness_wall + 3*46/4 + 1.5*microsd_size[1],
            25-0.5-(microsd_stack_gap-microsd_tolerance[2])])
        linear_extrude(height=font_height)
        text("A", font="Liberation Mono", size=font_size, halign="center");

    // Slot C
    translate([
            thickness_wall + slot_left_margin +
                (microsd_size+microsd_tolerance)[0]/2,
            thickness_wall + 2*46/4 + 1.5*microsd_size[1],
            25-0.5-(microsd_stack_gap-microsd_tolerance[2])])
        linear_extrude(height=font_height)
        text("C", font="Liberation Mono", size=font_size, halign="center");

    // Slot E
    translate([
            thickness_wall + slot_left_margin +
                (microsd_tolerance+microsd_size)[0]/2,
            thickness_wall + 46/4 + 1.5*microsd_size[1],
            25-0.5-(microsd_stack_gap-microsd_tolerance[2])])
        linear_extrude(height=font_height)
        text("E", font="Liberation Mono", size=font_size, halign="center");

    // Slot B
    translate([
            thickness_wall + slot_left_margin +
                microsd_size[0]+microsd_tolerance[0] + slot_left_margin +
                (microsd_size+microsd_tolerance)[0]/2,
            thickness_wall + 3*46/4 + 1.5*microsd_size[1],
            25-0.5-(microsd_stack_gap-microsd_tolerance[2])])
        linear_extrude(height=font_height)
        text("B", font="Liberation Mono", size=font_size, halign="center");

    // Slot D
    translate([
            thickness_wall + slot_left_margin + 
                microsd_size[0]+microsd_tolerance[0] + slot_left_margin +
                (microsd_size+microsd_tolerance)[0]/2,
            thickness_wall + 2*46/4 + 1.5*microsd_size[1],
            25-0.5-(microsd_stack_gap-microsd_tolerance[2])])
        linear_extrude(height=font_height)
        text("D", font="Liberation Mono", size=font_size, halign="center");

    // Slot F
    translate([
            thickness_wall + slot_left_margin + 
                microsd_size[0]+microsd_tolerance[0] + slot_left_margin +
                (microsd_size+microsd_tolerance)[0]/2,
            thickness_wall + 46/4 + 1.5*microsd_size[1],
            25-0.5-(microsd_stack_gap-microsd_tolerance[2])])
        linear_extrude(height=font_height)
        text("F", font="Liberation Mono", size=font_size, halign="center");
}
